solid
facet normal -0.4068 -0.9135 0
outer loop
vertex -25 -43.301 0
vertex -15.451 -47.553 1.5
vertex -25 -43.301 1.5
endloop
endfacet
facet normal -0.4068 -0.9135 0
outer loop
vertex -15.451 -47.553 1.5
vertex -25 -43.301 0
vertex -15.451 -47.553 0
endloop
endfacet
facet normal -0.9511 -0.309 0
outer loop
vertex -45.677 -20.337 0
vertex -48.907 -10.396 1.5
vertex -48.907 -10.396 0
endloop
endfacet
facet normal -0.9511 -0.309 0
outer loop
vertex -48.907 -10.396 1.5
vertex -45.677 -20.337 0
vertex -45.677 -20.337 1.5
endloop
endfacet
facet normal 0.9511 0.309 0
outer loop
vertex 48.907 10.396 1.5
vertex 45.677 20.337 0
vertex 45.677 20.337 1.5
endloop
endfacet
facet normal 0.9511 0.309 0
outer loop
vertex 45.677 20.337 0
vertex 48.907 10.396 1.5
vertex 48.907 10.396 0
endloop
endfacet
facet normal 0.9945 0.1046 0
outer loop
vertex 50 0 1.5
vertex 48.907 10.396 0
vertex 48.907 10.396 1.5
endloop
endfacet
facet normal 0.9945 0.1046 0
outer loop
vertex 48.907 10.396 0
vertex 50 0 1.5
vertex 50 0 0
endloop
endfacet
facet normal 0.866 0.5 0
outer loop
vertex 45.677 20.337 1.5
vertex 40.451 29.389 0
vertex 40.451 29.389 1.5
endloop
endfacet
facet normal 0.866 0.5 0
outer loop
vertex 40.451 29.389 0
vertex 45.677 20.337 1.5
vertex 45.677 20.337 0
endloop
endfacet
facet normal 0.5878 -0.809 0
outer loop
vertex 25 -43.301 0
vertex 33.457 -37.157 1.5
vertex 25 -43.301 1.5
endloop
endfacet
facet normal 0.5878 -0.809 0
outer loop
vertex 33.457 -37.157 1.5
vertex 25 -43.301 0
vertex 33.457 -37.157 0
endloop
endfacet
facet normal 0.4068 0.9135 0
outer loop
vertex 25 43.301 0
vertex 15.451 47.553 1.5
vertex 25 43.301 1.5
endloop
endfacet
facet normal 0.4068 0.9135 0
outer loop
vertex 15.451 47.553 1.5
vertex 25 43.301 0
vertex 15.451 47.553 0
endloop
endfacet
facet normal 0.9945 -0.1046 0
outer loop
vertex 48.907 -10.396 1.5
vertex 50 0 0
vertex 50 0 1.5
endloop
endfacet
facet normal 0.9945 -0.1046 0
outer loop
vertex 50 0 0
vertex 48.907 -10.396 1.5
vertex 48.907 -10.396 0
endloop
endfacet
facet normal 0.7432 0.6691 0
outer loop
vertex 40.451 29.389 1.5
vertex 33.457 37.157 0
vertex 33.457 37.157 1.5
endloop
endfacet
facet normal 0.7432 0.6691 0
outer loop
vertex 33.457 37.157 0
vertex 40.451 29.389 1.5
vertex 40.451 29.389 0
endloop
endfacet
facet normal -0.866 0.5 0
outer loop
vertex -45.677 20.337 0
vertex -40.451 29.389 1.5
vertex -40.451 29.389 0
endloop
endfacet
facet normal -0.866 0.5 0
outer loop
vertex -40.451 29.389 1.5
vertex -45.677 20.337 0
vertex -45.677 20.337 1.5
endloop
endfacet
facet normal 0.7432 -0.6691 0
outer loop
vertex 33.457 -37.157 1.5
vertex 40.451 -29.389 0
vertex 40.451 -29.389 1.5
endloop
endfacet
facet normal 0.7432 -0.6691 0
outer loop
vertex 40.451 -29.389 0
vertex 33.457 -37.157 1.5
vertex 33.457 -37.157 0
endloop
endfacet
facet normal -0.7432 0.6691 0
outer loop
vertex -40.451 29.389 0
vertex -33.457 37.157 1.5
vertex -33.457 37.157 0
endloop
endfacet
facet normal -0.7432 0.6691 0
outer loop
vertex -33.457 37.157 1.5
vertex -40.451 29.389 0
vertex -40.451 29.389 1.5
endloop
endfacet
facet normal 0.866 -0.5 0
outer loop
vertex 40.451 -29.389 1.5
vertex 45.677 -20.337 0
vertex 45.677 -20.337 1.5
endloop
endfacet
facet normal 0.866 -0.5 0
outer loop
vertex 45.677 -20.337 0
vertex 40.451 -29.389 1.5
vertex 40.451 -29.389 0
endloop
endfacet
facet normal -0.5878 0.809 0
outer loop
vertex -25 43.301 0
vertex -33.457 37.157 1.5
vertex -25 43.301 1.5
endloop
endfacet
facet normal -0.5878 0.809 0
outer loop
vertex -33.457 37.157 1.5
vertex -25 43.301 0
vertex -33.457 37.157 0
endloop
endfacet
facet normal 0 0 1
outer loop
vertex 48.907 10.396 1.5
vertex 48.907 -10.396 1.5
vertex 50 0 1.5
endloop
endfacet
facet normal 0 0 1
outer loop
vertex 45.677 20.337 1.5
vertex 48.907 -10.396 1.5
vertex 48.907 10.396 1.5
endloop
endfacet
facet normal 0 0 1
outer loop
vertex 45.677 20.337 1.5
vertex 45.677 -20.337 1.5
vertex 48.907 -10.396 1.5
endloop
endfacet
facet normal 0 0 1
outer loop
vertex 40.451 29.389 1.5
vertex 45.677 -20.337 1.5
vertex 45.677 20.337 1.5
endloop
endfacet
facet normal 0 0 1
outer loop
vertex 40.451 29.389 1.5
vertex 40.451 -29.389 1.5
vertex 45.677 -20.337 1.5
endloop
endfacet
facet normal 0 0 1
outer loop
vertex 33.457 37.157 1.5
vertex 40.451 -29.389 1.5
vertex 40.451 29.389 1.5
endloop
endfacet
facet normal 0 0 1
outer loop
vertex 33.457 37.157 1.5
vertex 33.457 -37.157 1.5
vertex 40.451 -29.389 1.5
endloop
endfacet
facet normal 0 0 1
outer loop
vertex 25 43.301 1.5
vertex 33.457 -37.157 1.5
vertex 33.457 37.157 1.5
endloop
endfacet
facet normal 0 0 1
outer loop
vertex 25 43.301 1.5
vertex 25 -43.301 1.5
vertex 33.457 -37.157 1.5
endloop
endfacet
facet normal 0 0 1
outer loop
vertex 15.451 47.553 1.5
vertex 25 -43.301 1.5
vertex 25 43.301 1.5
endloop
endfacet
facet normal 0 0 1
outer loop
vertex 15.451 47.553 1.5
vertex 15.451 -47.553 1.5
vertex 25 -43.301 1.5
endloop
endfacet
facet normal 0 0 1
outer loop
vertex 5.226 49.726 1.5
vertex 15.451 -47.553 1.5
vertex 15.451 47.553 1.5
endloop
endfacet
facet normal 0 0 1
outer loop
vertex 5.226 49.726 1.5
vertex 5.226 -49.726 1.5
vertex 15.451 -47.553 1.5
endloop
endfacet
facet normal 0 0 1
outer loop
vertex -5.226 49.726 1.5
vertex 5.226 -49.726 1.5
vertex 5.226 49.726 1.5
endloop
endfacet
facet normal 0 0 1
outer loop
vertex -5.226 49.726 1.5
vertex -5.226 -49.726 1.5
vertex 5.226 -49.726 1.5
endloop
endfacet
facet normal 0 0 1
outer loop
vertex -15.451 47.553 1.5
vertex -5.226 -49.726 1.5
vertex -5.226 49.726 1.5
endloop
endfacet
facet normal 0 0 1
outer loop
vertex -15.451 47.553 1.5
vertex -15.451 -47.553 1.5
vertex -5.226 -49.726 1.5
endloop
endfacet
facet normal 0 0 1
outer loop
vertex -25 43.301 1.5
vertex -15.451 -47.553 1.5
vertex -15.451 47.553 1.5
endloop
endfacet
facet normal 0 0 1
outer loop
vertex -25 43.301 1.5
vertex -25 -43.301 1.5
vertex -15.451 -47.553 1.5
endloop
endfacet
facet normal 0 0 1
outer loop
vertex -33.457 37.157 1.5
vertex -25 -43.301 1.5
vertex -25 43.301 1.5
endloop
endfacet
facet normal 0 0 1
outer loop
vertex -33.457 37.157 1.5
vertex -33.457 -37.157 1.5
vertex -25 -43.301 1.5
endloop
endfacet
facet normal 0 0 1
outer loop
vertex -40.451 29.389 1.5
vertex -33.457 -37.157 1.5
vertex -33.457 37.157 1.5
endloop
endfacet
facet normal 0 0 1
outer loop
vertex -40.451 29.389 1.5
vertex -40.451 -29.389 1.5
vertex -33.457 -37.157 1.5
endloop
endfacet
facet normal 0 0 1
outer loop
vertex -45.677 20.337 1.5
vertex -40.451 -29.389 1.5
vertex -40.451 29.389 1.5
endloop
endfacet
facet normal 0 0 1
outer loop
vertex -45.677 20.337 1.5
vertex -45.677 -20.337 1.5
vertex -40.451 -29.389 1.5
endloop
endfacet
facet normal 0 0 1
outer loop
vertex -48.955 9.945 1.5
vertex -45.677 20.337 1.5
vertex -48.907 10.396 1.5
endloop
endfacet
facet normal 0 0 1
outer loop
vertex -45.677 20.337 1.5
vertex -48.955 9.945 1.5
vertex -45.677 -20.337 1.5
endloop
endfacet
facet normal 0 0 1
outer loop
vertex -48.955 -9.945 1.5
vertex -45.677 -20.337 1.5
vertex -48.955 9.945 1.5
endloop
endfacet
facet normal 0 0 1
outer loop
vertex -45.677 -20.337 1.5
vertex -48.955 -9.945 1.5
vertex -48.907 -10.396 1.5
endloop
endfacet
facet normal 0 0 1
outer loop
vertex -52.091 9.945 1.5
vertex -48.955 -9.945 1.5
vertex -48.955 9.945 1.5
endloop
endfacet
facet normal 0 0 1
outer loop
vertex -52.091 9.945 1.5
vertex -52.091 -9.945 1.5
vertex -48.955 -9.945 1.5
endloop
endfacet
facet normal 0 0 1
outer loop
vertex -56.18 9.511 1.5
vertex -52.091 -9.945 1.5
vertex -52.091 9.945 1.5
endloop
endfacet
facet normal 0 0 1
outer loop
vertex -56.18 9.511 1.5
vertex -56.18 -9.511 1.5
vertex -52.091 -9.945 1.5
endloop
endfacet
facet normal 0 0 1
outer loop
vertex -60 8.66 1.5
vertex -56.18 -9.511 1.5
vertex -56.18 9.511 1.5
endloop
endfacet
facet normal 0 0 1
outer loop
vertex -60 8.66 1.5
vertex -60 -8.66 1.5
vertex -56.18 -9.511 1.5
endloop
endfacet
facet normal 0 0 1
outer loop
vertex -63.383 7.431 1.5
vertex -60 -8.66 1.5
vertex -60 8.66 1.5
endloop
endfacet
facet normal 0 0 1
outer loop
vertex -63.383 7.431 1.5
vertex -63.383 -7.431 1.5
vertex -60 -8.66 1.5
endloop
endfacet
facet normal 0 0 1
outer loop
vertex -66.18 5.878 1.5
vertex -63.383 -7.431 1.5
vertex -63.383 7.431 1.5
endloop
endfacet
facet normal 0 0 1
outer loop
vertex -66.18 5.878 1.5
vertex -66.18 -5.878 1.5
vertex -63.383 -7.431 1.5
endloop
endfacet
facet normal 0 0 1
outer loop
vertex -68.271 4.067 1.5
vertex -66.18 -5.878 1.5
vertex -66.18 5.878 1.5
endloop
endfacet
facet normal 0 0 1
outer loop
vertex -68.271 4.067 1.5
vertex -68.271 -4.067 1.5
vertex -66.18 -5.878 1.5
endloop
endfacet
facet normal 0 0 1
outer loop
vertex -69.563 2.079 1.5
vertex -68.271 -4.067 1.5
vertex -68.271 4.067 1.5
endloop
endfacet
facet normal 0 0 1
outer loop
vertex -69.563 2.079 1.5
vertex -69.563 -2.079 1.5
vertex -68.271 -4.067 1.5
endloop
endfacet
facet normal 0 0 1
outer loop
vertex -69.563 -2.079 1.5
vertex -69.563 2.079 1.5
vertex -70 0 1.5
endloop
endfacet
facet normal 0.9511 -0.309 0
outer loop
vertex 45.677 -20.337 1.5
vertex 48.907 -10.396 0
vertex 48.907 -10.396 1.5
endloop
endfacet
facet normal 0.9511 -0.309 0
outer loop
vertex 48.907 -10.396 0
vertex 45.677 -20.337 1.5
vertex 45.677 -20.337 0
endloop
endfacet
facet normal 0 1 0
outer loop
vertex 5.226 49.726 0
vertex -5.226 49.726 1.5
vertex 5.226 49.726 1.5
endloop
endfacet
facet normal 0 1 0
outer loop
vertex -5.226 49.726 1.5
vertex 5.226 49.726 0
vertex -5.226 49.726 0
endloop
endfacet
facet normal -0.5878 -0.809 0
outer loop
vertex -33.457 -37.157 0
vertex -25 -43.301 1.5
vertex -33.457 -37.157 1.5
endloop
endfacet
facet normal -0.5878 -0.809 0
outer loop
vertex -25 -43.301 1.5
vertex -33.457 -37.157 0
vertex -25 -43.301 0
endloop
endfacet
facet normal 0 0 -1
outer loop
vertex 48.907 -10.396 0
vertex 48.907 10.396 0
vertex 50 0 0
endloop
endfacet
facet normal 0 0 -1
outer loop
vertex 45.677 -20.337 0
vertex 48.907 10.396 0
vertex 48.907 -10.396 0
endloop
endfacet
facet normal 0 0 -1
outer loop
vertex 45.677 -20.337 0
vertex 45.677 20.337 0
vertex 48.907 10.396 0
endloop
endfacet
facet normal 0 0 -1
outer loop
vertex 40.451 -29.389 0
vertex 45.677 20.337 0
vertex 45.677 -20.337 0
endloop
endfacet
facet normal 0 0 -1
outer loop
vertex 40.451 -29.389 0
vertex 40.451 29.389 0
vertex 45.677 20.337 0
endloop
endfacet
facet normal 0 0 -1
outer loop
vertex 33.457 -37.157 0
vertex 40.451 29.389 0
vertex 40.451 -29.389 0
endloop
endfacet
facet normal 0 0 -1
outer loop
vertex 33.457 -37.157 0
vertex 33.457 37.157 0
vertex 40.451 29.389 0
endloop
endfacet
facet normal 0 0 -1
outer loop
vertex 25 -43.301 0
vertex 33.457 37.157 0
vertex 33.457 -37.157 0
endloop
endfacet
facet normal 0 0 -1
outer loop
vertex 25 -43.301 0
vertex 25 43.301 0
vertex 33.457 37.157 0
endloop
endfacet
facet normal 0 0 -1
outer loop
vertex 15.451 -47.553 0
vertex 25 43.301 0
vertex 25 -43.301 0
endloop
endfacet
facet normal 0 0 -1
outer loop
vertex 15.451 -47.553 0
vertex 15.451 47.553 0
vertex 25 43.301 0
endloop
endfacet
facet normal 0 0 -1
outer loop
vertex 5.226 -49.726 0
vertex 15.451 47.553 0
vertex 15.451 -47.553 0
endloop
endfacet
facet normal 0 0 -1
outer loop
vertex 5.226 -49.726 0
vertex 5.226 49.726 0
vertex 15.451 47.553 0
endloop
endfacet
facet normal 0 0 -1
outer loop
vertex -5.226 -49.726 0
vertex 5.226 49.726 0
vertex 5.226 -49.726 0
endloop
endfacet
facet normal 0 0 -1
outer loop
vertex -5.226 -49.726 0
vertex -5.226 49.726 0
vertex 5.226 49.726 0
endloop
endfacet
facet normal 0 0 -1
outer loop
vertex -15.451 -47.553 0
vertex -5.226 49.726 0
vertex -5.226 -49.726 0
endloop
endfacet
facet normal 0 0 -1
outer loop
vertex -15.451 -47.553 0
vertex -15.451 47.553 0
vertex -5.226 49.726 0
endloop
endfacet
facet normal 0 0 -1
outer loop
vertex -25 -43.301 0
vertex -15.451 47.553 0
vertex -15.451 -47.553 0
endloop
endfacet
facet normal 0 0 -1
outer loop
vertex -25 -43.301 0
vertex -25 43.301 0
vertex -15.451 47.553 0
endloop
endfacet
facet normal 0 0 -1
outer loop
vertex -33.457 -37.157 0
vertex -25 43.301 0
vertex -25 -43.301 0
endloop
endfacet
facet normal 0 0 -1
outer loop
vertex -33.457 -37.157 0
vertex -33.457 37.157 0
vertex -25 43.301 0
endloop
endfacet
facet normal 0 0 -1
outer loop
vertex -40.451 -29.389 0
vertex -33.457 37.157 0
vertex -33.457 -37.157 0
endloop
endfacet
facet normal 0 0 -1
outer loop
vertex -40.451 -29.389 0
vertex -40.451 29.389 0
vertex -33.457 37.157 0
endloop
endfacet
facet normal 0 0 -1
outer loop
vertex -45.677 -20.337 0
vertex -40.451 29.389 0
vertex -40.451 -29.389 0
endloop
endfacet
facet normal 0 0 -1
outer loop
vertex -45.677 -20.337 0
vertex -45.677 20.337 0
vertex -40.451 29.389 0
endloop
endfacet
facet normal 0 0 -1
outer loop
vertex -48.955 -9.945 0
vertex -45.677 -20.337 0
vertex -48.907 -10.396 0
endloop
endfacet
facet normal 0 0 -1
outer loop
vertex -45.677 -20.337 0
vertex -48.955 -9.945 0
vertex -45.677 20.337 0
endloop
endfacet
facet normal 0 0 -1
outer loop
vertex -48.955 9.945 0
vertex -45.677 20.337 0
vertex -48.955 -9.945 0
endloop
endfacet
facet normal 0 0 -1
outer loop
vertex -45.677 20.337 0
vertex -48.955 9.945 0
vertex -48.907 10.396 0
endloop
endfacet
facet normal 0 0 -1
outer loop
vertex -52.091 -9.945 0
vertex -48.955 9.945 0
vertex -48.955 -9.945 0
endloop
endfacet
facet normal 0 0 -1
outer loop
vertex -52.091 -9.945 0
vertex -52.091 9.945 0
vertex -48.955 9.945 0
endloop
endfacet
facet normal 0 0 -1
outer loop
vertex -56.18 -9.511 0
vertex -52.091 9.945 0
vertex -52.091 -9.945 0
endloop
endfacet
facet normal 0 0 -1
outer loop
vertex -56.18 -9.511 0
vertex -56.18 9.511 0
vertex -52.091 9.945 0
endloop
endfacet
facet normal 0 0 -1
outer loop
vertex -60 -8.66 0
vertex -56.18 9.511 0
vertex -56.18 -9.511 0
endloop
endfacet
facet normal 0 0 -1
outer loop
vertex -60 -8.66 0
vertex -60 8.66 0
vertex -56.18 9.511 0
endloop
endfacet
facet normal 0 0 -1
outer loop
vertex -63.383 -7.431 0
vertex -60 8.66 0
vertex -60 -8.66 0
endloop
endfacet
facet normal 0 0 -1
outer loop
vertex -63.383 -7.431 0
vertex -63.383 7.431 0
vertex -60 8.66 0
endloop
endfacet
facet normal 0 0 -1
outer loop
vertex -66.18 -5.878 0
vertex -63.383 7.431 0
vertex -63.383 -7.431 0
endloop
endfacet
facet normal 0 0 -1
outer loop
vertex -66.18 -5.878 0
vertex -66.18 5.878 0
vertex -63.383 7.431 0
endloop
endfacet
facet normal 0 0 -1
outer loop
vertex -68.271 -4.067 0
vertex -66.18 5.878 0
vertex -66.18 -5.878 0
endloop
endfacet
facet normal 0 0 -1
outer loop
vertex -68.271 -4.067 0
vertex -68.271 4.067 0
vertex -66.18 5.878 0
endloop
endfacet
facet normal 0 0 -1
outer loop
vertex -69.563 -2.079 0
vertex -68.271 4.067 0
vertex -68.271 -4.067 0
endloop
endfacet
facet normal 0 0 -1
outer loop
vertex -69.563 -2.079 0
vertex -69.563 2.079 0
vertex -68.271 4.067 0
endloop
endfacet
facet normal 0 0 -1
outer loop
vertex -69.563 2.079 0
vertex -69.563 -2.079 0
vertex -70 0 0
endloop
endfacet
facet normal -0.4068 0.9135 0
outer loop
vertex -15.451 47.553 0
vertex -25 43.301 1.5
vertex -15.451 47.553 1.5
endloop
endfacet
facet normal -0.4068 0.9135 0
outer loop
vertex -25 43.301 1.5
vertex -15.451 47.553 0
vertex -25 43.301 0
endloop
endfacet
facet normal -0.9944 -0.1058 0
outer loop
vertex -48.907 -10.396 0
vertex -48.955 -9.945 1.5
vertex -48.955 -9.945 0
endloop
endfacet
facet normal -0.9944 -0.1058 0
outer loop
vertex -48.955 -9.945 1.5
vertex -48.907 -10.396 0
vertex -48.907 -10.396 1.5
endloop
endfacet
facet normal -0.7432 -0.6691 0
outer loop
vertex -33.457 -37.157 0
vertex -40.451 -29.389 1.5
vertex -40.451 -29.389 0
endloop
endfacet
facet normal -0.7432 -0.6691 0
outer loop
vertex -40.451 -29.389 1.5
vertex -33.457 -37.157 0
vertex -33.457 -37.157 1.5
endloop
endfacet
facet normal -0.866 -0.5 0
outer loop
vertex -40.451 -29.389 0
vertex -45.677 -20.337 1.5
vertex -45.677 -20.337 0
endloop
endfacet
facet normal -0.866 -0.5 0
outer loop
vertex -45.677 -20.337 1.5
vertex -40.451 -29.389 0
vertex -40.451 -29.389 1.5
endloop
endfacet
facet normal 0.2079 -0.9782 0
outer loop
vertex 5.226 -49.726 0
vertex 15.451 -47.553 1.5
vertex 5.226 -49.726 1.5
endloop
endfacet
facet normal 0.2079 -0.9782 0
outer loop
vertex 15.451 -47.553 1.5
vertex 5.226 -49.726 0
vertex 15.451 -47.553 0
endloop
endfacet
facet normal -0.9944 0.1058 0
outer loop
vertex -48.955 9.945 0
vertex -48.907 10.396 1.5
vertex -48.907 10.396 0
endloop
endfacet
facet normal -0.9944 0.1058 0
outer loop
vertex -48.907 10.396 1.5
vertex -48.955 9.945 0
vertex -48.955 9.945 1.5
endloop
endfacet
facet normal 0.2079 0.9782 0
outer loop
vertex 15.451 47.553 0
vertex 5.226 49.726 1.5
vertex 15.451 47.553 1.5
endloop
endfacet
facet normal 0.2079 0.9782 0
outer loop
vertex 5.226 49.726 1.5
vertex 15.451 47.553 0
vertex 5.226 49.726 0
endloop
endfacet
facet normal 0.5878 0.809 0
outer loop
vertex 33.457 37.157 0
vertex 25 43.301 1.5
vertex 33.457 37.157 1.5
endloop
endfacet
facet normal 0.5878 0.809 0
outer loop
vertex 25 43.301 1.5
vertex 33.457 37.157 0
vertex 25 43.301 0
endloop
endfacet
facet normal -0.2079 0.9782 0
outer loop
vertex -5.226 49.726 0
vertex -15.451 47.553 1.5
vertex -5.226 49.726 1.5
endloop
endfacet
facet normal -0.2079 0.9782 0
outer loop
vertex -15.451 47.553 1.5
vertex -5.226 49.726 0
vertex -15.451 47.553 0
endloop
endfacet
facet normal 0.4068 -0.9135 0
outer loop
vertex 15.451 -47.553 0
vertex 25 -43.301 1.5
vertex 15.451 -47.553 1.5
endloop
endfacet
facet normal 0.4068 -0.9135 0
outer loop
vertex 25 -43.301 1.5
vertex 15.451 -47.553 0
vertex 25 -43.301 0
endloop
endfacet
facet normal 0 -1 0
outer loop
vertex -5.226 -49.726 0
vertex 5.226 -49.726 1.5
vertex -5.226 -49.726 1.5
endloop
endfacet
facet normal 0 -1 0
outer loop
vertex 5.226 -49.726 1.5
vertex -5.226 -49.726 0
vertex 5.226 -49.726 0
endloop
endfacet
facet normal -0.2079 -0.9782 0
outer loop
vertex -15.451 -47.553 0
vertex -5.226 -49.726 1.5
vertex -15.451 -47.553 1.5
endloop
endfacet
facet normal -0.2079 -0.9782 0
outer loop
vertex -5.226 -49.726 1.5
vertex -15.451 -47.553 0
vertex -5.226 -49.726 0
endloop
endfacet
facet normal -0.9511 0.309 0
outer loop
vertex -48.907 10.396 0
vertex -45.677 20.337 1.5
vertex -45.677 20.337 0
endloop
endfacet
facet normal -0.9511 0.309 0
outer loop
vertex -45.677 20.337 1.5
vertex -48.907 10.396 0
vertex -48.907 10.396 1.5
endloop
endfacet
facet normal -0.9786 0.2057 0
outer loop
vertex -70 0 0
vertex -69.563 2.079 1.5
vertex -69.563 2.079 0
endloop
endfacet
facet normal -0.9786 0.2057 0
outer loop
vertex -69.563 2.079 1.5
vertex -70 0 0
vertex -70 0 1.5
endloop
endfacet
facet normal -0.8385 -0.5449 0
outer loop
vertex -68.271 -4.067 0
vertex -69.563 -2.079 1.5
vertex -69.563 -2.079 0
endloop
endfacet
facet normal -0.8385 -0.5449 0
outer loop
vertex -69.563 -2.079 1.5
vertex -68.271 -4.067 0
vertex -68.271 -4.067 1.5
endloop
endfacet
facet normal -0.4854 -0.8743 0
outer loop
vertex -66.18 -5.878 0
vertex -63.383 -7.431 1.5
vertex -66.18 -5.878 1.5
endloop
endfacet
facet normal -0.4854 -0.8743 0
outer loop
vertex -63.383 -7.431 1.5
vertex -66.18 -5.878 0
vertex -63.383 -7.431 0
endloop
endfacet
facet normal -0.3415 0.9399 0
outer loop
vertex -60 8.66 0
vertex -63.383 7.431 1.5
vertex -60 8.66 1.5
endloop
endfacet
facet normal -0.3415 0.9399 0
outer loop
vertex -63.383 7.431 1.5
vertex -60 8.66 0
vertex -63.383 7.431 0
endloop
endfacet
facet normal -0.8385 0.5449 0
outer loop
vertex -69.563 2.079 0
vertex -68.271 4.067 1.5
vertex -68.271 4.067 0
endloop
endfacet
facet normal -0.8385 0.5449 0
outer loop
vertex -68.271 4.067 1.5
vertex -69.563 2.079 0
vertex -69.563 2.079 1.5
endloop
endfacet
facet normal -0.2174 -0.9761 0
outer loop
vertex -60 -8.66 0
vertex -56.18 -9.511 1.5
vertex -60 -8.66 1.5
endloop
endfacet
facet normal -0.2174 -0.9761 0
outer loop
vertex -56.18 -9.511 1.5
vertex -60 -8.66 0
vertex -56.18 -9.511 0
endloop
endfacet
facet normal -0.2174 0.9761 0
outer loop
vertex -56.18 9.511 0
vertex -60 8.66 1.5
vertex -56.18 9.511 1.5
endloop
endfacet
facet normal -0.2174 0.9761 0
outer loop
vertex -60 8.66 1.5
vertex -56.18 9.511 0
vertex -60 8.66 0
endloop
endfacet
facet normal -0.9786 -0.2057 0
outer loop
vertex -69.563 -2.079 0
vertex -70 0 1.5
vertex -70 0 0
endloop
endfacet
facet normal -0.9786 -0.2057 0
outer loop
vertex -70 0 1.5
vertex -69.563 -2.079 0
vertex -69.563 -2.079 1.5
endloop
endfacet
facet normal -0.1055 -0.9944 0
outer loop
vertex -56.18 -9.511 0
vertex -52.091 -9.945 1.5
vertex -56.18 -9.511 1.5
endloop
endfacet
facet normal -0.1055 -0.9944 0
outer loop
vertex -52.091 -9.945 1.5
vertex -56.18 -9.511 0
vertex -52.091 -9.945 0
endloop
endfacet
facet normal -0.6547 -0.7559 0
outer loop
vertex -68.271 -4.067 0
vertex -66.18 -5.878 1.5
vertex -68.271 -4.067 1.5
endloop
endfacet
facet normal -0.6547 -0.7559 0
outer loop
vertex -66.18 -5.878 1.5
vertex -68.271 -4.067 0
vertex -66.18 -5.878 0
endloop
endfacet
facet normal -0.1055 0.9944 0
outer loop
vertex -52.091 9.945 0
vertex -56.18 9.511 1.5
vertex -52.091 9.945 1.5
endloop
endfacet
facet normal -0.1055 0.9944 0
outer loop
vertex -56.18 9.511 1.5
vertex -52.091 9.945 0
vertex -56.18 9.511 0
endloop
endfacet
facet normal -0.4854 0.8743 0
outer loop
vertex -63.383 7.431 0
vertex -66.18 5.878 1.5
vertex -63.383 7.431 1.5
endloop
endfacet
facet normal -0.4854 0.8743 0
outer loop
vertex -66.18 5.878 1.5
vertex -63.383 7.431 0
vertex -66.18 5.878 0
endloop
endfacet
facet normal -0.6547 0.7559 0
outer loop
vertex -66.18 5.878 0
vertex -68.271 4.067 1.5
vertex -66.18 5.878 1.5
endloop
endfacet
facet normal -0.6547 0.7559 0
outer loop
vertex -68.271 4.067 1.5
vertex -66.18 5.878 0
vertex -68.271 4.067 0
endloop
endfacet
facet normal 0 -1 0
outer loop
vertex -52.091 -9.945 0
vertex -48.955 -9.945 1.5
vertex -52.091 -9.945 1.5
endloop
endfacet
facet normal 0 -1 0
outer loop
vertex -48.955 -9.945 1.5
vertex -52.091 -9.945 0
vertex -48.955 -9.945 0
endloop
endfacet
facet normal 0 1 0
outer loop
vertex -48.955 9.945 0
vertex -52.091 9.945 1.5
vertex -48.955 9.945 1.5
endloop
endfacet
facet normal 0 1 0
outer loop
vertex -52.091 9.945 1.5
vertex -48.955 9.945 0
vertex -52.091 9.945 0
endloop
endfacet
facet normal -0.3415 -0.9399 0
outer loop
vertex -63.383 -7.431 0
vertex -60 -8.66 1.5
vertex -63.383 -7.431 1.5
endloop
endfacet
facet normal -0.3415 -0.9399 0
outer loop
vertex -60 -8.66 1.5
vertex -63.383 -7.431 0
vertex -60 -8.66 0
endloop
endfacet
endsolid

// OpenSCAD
// Load a 100x100 pixel image.(images will be stretched to fit) Simple, high contrast images work best. Make sure to click the Invert Colors checkbox!
image_file = "c:\\Logo\\symbol_vertix_K_neg_cropped_100x100.png"; // [image_surface100x100]
height = 1.5;
radius = 50;
handle_radius = 10;
image_width = 40;
image_length = 40;


assembly();
module assembly(){
    difference(){
        union(){
               cylinder (r=radius, h=height);
               translate([-50,0,0]) {scale ([2,1,1]) cylinder (r=handle_radius, h=height);}
        }
        scale([(image_width)/100,(image_length)/100,height+1]) surface(file=image_file, center=true);
        
    };
    };
